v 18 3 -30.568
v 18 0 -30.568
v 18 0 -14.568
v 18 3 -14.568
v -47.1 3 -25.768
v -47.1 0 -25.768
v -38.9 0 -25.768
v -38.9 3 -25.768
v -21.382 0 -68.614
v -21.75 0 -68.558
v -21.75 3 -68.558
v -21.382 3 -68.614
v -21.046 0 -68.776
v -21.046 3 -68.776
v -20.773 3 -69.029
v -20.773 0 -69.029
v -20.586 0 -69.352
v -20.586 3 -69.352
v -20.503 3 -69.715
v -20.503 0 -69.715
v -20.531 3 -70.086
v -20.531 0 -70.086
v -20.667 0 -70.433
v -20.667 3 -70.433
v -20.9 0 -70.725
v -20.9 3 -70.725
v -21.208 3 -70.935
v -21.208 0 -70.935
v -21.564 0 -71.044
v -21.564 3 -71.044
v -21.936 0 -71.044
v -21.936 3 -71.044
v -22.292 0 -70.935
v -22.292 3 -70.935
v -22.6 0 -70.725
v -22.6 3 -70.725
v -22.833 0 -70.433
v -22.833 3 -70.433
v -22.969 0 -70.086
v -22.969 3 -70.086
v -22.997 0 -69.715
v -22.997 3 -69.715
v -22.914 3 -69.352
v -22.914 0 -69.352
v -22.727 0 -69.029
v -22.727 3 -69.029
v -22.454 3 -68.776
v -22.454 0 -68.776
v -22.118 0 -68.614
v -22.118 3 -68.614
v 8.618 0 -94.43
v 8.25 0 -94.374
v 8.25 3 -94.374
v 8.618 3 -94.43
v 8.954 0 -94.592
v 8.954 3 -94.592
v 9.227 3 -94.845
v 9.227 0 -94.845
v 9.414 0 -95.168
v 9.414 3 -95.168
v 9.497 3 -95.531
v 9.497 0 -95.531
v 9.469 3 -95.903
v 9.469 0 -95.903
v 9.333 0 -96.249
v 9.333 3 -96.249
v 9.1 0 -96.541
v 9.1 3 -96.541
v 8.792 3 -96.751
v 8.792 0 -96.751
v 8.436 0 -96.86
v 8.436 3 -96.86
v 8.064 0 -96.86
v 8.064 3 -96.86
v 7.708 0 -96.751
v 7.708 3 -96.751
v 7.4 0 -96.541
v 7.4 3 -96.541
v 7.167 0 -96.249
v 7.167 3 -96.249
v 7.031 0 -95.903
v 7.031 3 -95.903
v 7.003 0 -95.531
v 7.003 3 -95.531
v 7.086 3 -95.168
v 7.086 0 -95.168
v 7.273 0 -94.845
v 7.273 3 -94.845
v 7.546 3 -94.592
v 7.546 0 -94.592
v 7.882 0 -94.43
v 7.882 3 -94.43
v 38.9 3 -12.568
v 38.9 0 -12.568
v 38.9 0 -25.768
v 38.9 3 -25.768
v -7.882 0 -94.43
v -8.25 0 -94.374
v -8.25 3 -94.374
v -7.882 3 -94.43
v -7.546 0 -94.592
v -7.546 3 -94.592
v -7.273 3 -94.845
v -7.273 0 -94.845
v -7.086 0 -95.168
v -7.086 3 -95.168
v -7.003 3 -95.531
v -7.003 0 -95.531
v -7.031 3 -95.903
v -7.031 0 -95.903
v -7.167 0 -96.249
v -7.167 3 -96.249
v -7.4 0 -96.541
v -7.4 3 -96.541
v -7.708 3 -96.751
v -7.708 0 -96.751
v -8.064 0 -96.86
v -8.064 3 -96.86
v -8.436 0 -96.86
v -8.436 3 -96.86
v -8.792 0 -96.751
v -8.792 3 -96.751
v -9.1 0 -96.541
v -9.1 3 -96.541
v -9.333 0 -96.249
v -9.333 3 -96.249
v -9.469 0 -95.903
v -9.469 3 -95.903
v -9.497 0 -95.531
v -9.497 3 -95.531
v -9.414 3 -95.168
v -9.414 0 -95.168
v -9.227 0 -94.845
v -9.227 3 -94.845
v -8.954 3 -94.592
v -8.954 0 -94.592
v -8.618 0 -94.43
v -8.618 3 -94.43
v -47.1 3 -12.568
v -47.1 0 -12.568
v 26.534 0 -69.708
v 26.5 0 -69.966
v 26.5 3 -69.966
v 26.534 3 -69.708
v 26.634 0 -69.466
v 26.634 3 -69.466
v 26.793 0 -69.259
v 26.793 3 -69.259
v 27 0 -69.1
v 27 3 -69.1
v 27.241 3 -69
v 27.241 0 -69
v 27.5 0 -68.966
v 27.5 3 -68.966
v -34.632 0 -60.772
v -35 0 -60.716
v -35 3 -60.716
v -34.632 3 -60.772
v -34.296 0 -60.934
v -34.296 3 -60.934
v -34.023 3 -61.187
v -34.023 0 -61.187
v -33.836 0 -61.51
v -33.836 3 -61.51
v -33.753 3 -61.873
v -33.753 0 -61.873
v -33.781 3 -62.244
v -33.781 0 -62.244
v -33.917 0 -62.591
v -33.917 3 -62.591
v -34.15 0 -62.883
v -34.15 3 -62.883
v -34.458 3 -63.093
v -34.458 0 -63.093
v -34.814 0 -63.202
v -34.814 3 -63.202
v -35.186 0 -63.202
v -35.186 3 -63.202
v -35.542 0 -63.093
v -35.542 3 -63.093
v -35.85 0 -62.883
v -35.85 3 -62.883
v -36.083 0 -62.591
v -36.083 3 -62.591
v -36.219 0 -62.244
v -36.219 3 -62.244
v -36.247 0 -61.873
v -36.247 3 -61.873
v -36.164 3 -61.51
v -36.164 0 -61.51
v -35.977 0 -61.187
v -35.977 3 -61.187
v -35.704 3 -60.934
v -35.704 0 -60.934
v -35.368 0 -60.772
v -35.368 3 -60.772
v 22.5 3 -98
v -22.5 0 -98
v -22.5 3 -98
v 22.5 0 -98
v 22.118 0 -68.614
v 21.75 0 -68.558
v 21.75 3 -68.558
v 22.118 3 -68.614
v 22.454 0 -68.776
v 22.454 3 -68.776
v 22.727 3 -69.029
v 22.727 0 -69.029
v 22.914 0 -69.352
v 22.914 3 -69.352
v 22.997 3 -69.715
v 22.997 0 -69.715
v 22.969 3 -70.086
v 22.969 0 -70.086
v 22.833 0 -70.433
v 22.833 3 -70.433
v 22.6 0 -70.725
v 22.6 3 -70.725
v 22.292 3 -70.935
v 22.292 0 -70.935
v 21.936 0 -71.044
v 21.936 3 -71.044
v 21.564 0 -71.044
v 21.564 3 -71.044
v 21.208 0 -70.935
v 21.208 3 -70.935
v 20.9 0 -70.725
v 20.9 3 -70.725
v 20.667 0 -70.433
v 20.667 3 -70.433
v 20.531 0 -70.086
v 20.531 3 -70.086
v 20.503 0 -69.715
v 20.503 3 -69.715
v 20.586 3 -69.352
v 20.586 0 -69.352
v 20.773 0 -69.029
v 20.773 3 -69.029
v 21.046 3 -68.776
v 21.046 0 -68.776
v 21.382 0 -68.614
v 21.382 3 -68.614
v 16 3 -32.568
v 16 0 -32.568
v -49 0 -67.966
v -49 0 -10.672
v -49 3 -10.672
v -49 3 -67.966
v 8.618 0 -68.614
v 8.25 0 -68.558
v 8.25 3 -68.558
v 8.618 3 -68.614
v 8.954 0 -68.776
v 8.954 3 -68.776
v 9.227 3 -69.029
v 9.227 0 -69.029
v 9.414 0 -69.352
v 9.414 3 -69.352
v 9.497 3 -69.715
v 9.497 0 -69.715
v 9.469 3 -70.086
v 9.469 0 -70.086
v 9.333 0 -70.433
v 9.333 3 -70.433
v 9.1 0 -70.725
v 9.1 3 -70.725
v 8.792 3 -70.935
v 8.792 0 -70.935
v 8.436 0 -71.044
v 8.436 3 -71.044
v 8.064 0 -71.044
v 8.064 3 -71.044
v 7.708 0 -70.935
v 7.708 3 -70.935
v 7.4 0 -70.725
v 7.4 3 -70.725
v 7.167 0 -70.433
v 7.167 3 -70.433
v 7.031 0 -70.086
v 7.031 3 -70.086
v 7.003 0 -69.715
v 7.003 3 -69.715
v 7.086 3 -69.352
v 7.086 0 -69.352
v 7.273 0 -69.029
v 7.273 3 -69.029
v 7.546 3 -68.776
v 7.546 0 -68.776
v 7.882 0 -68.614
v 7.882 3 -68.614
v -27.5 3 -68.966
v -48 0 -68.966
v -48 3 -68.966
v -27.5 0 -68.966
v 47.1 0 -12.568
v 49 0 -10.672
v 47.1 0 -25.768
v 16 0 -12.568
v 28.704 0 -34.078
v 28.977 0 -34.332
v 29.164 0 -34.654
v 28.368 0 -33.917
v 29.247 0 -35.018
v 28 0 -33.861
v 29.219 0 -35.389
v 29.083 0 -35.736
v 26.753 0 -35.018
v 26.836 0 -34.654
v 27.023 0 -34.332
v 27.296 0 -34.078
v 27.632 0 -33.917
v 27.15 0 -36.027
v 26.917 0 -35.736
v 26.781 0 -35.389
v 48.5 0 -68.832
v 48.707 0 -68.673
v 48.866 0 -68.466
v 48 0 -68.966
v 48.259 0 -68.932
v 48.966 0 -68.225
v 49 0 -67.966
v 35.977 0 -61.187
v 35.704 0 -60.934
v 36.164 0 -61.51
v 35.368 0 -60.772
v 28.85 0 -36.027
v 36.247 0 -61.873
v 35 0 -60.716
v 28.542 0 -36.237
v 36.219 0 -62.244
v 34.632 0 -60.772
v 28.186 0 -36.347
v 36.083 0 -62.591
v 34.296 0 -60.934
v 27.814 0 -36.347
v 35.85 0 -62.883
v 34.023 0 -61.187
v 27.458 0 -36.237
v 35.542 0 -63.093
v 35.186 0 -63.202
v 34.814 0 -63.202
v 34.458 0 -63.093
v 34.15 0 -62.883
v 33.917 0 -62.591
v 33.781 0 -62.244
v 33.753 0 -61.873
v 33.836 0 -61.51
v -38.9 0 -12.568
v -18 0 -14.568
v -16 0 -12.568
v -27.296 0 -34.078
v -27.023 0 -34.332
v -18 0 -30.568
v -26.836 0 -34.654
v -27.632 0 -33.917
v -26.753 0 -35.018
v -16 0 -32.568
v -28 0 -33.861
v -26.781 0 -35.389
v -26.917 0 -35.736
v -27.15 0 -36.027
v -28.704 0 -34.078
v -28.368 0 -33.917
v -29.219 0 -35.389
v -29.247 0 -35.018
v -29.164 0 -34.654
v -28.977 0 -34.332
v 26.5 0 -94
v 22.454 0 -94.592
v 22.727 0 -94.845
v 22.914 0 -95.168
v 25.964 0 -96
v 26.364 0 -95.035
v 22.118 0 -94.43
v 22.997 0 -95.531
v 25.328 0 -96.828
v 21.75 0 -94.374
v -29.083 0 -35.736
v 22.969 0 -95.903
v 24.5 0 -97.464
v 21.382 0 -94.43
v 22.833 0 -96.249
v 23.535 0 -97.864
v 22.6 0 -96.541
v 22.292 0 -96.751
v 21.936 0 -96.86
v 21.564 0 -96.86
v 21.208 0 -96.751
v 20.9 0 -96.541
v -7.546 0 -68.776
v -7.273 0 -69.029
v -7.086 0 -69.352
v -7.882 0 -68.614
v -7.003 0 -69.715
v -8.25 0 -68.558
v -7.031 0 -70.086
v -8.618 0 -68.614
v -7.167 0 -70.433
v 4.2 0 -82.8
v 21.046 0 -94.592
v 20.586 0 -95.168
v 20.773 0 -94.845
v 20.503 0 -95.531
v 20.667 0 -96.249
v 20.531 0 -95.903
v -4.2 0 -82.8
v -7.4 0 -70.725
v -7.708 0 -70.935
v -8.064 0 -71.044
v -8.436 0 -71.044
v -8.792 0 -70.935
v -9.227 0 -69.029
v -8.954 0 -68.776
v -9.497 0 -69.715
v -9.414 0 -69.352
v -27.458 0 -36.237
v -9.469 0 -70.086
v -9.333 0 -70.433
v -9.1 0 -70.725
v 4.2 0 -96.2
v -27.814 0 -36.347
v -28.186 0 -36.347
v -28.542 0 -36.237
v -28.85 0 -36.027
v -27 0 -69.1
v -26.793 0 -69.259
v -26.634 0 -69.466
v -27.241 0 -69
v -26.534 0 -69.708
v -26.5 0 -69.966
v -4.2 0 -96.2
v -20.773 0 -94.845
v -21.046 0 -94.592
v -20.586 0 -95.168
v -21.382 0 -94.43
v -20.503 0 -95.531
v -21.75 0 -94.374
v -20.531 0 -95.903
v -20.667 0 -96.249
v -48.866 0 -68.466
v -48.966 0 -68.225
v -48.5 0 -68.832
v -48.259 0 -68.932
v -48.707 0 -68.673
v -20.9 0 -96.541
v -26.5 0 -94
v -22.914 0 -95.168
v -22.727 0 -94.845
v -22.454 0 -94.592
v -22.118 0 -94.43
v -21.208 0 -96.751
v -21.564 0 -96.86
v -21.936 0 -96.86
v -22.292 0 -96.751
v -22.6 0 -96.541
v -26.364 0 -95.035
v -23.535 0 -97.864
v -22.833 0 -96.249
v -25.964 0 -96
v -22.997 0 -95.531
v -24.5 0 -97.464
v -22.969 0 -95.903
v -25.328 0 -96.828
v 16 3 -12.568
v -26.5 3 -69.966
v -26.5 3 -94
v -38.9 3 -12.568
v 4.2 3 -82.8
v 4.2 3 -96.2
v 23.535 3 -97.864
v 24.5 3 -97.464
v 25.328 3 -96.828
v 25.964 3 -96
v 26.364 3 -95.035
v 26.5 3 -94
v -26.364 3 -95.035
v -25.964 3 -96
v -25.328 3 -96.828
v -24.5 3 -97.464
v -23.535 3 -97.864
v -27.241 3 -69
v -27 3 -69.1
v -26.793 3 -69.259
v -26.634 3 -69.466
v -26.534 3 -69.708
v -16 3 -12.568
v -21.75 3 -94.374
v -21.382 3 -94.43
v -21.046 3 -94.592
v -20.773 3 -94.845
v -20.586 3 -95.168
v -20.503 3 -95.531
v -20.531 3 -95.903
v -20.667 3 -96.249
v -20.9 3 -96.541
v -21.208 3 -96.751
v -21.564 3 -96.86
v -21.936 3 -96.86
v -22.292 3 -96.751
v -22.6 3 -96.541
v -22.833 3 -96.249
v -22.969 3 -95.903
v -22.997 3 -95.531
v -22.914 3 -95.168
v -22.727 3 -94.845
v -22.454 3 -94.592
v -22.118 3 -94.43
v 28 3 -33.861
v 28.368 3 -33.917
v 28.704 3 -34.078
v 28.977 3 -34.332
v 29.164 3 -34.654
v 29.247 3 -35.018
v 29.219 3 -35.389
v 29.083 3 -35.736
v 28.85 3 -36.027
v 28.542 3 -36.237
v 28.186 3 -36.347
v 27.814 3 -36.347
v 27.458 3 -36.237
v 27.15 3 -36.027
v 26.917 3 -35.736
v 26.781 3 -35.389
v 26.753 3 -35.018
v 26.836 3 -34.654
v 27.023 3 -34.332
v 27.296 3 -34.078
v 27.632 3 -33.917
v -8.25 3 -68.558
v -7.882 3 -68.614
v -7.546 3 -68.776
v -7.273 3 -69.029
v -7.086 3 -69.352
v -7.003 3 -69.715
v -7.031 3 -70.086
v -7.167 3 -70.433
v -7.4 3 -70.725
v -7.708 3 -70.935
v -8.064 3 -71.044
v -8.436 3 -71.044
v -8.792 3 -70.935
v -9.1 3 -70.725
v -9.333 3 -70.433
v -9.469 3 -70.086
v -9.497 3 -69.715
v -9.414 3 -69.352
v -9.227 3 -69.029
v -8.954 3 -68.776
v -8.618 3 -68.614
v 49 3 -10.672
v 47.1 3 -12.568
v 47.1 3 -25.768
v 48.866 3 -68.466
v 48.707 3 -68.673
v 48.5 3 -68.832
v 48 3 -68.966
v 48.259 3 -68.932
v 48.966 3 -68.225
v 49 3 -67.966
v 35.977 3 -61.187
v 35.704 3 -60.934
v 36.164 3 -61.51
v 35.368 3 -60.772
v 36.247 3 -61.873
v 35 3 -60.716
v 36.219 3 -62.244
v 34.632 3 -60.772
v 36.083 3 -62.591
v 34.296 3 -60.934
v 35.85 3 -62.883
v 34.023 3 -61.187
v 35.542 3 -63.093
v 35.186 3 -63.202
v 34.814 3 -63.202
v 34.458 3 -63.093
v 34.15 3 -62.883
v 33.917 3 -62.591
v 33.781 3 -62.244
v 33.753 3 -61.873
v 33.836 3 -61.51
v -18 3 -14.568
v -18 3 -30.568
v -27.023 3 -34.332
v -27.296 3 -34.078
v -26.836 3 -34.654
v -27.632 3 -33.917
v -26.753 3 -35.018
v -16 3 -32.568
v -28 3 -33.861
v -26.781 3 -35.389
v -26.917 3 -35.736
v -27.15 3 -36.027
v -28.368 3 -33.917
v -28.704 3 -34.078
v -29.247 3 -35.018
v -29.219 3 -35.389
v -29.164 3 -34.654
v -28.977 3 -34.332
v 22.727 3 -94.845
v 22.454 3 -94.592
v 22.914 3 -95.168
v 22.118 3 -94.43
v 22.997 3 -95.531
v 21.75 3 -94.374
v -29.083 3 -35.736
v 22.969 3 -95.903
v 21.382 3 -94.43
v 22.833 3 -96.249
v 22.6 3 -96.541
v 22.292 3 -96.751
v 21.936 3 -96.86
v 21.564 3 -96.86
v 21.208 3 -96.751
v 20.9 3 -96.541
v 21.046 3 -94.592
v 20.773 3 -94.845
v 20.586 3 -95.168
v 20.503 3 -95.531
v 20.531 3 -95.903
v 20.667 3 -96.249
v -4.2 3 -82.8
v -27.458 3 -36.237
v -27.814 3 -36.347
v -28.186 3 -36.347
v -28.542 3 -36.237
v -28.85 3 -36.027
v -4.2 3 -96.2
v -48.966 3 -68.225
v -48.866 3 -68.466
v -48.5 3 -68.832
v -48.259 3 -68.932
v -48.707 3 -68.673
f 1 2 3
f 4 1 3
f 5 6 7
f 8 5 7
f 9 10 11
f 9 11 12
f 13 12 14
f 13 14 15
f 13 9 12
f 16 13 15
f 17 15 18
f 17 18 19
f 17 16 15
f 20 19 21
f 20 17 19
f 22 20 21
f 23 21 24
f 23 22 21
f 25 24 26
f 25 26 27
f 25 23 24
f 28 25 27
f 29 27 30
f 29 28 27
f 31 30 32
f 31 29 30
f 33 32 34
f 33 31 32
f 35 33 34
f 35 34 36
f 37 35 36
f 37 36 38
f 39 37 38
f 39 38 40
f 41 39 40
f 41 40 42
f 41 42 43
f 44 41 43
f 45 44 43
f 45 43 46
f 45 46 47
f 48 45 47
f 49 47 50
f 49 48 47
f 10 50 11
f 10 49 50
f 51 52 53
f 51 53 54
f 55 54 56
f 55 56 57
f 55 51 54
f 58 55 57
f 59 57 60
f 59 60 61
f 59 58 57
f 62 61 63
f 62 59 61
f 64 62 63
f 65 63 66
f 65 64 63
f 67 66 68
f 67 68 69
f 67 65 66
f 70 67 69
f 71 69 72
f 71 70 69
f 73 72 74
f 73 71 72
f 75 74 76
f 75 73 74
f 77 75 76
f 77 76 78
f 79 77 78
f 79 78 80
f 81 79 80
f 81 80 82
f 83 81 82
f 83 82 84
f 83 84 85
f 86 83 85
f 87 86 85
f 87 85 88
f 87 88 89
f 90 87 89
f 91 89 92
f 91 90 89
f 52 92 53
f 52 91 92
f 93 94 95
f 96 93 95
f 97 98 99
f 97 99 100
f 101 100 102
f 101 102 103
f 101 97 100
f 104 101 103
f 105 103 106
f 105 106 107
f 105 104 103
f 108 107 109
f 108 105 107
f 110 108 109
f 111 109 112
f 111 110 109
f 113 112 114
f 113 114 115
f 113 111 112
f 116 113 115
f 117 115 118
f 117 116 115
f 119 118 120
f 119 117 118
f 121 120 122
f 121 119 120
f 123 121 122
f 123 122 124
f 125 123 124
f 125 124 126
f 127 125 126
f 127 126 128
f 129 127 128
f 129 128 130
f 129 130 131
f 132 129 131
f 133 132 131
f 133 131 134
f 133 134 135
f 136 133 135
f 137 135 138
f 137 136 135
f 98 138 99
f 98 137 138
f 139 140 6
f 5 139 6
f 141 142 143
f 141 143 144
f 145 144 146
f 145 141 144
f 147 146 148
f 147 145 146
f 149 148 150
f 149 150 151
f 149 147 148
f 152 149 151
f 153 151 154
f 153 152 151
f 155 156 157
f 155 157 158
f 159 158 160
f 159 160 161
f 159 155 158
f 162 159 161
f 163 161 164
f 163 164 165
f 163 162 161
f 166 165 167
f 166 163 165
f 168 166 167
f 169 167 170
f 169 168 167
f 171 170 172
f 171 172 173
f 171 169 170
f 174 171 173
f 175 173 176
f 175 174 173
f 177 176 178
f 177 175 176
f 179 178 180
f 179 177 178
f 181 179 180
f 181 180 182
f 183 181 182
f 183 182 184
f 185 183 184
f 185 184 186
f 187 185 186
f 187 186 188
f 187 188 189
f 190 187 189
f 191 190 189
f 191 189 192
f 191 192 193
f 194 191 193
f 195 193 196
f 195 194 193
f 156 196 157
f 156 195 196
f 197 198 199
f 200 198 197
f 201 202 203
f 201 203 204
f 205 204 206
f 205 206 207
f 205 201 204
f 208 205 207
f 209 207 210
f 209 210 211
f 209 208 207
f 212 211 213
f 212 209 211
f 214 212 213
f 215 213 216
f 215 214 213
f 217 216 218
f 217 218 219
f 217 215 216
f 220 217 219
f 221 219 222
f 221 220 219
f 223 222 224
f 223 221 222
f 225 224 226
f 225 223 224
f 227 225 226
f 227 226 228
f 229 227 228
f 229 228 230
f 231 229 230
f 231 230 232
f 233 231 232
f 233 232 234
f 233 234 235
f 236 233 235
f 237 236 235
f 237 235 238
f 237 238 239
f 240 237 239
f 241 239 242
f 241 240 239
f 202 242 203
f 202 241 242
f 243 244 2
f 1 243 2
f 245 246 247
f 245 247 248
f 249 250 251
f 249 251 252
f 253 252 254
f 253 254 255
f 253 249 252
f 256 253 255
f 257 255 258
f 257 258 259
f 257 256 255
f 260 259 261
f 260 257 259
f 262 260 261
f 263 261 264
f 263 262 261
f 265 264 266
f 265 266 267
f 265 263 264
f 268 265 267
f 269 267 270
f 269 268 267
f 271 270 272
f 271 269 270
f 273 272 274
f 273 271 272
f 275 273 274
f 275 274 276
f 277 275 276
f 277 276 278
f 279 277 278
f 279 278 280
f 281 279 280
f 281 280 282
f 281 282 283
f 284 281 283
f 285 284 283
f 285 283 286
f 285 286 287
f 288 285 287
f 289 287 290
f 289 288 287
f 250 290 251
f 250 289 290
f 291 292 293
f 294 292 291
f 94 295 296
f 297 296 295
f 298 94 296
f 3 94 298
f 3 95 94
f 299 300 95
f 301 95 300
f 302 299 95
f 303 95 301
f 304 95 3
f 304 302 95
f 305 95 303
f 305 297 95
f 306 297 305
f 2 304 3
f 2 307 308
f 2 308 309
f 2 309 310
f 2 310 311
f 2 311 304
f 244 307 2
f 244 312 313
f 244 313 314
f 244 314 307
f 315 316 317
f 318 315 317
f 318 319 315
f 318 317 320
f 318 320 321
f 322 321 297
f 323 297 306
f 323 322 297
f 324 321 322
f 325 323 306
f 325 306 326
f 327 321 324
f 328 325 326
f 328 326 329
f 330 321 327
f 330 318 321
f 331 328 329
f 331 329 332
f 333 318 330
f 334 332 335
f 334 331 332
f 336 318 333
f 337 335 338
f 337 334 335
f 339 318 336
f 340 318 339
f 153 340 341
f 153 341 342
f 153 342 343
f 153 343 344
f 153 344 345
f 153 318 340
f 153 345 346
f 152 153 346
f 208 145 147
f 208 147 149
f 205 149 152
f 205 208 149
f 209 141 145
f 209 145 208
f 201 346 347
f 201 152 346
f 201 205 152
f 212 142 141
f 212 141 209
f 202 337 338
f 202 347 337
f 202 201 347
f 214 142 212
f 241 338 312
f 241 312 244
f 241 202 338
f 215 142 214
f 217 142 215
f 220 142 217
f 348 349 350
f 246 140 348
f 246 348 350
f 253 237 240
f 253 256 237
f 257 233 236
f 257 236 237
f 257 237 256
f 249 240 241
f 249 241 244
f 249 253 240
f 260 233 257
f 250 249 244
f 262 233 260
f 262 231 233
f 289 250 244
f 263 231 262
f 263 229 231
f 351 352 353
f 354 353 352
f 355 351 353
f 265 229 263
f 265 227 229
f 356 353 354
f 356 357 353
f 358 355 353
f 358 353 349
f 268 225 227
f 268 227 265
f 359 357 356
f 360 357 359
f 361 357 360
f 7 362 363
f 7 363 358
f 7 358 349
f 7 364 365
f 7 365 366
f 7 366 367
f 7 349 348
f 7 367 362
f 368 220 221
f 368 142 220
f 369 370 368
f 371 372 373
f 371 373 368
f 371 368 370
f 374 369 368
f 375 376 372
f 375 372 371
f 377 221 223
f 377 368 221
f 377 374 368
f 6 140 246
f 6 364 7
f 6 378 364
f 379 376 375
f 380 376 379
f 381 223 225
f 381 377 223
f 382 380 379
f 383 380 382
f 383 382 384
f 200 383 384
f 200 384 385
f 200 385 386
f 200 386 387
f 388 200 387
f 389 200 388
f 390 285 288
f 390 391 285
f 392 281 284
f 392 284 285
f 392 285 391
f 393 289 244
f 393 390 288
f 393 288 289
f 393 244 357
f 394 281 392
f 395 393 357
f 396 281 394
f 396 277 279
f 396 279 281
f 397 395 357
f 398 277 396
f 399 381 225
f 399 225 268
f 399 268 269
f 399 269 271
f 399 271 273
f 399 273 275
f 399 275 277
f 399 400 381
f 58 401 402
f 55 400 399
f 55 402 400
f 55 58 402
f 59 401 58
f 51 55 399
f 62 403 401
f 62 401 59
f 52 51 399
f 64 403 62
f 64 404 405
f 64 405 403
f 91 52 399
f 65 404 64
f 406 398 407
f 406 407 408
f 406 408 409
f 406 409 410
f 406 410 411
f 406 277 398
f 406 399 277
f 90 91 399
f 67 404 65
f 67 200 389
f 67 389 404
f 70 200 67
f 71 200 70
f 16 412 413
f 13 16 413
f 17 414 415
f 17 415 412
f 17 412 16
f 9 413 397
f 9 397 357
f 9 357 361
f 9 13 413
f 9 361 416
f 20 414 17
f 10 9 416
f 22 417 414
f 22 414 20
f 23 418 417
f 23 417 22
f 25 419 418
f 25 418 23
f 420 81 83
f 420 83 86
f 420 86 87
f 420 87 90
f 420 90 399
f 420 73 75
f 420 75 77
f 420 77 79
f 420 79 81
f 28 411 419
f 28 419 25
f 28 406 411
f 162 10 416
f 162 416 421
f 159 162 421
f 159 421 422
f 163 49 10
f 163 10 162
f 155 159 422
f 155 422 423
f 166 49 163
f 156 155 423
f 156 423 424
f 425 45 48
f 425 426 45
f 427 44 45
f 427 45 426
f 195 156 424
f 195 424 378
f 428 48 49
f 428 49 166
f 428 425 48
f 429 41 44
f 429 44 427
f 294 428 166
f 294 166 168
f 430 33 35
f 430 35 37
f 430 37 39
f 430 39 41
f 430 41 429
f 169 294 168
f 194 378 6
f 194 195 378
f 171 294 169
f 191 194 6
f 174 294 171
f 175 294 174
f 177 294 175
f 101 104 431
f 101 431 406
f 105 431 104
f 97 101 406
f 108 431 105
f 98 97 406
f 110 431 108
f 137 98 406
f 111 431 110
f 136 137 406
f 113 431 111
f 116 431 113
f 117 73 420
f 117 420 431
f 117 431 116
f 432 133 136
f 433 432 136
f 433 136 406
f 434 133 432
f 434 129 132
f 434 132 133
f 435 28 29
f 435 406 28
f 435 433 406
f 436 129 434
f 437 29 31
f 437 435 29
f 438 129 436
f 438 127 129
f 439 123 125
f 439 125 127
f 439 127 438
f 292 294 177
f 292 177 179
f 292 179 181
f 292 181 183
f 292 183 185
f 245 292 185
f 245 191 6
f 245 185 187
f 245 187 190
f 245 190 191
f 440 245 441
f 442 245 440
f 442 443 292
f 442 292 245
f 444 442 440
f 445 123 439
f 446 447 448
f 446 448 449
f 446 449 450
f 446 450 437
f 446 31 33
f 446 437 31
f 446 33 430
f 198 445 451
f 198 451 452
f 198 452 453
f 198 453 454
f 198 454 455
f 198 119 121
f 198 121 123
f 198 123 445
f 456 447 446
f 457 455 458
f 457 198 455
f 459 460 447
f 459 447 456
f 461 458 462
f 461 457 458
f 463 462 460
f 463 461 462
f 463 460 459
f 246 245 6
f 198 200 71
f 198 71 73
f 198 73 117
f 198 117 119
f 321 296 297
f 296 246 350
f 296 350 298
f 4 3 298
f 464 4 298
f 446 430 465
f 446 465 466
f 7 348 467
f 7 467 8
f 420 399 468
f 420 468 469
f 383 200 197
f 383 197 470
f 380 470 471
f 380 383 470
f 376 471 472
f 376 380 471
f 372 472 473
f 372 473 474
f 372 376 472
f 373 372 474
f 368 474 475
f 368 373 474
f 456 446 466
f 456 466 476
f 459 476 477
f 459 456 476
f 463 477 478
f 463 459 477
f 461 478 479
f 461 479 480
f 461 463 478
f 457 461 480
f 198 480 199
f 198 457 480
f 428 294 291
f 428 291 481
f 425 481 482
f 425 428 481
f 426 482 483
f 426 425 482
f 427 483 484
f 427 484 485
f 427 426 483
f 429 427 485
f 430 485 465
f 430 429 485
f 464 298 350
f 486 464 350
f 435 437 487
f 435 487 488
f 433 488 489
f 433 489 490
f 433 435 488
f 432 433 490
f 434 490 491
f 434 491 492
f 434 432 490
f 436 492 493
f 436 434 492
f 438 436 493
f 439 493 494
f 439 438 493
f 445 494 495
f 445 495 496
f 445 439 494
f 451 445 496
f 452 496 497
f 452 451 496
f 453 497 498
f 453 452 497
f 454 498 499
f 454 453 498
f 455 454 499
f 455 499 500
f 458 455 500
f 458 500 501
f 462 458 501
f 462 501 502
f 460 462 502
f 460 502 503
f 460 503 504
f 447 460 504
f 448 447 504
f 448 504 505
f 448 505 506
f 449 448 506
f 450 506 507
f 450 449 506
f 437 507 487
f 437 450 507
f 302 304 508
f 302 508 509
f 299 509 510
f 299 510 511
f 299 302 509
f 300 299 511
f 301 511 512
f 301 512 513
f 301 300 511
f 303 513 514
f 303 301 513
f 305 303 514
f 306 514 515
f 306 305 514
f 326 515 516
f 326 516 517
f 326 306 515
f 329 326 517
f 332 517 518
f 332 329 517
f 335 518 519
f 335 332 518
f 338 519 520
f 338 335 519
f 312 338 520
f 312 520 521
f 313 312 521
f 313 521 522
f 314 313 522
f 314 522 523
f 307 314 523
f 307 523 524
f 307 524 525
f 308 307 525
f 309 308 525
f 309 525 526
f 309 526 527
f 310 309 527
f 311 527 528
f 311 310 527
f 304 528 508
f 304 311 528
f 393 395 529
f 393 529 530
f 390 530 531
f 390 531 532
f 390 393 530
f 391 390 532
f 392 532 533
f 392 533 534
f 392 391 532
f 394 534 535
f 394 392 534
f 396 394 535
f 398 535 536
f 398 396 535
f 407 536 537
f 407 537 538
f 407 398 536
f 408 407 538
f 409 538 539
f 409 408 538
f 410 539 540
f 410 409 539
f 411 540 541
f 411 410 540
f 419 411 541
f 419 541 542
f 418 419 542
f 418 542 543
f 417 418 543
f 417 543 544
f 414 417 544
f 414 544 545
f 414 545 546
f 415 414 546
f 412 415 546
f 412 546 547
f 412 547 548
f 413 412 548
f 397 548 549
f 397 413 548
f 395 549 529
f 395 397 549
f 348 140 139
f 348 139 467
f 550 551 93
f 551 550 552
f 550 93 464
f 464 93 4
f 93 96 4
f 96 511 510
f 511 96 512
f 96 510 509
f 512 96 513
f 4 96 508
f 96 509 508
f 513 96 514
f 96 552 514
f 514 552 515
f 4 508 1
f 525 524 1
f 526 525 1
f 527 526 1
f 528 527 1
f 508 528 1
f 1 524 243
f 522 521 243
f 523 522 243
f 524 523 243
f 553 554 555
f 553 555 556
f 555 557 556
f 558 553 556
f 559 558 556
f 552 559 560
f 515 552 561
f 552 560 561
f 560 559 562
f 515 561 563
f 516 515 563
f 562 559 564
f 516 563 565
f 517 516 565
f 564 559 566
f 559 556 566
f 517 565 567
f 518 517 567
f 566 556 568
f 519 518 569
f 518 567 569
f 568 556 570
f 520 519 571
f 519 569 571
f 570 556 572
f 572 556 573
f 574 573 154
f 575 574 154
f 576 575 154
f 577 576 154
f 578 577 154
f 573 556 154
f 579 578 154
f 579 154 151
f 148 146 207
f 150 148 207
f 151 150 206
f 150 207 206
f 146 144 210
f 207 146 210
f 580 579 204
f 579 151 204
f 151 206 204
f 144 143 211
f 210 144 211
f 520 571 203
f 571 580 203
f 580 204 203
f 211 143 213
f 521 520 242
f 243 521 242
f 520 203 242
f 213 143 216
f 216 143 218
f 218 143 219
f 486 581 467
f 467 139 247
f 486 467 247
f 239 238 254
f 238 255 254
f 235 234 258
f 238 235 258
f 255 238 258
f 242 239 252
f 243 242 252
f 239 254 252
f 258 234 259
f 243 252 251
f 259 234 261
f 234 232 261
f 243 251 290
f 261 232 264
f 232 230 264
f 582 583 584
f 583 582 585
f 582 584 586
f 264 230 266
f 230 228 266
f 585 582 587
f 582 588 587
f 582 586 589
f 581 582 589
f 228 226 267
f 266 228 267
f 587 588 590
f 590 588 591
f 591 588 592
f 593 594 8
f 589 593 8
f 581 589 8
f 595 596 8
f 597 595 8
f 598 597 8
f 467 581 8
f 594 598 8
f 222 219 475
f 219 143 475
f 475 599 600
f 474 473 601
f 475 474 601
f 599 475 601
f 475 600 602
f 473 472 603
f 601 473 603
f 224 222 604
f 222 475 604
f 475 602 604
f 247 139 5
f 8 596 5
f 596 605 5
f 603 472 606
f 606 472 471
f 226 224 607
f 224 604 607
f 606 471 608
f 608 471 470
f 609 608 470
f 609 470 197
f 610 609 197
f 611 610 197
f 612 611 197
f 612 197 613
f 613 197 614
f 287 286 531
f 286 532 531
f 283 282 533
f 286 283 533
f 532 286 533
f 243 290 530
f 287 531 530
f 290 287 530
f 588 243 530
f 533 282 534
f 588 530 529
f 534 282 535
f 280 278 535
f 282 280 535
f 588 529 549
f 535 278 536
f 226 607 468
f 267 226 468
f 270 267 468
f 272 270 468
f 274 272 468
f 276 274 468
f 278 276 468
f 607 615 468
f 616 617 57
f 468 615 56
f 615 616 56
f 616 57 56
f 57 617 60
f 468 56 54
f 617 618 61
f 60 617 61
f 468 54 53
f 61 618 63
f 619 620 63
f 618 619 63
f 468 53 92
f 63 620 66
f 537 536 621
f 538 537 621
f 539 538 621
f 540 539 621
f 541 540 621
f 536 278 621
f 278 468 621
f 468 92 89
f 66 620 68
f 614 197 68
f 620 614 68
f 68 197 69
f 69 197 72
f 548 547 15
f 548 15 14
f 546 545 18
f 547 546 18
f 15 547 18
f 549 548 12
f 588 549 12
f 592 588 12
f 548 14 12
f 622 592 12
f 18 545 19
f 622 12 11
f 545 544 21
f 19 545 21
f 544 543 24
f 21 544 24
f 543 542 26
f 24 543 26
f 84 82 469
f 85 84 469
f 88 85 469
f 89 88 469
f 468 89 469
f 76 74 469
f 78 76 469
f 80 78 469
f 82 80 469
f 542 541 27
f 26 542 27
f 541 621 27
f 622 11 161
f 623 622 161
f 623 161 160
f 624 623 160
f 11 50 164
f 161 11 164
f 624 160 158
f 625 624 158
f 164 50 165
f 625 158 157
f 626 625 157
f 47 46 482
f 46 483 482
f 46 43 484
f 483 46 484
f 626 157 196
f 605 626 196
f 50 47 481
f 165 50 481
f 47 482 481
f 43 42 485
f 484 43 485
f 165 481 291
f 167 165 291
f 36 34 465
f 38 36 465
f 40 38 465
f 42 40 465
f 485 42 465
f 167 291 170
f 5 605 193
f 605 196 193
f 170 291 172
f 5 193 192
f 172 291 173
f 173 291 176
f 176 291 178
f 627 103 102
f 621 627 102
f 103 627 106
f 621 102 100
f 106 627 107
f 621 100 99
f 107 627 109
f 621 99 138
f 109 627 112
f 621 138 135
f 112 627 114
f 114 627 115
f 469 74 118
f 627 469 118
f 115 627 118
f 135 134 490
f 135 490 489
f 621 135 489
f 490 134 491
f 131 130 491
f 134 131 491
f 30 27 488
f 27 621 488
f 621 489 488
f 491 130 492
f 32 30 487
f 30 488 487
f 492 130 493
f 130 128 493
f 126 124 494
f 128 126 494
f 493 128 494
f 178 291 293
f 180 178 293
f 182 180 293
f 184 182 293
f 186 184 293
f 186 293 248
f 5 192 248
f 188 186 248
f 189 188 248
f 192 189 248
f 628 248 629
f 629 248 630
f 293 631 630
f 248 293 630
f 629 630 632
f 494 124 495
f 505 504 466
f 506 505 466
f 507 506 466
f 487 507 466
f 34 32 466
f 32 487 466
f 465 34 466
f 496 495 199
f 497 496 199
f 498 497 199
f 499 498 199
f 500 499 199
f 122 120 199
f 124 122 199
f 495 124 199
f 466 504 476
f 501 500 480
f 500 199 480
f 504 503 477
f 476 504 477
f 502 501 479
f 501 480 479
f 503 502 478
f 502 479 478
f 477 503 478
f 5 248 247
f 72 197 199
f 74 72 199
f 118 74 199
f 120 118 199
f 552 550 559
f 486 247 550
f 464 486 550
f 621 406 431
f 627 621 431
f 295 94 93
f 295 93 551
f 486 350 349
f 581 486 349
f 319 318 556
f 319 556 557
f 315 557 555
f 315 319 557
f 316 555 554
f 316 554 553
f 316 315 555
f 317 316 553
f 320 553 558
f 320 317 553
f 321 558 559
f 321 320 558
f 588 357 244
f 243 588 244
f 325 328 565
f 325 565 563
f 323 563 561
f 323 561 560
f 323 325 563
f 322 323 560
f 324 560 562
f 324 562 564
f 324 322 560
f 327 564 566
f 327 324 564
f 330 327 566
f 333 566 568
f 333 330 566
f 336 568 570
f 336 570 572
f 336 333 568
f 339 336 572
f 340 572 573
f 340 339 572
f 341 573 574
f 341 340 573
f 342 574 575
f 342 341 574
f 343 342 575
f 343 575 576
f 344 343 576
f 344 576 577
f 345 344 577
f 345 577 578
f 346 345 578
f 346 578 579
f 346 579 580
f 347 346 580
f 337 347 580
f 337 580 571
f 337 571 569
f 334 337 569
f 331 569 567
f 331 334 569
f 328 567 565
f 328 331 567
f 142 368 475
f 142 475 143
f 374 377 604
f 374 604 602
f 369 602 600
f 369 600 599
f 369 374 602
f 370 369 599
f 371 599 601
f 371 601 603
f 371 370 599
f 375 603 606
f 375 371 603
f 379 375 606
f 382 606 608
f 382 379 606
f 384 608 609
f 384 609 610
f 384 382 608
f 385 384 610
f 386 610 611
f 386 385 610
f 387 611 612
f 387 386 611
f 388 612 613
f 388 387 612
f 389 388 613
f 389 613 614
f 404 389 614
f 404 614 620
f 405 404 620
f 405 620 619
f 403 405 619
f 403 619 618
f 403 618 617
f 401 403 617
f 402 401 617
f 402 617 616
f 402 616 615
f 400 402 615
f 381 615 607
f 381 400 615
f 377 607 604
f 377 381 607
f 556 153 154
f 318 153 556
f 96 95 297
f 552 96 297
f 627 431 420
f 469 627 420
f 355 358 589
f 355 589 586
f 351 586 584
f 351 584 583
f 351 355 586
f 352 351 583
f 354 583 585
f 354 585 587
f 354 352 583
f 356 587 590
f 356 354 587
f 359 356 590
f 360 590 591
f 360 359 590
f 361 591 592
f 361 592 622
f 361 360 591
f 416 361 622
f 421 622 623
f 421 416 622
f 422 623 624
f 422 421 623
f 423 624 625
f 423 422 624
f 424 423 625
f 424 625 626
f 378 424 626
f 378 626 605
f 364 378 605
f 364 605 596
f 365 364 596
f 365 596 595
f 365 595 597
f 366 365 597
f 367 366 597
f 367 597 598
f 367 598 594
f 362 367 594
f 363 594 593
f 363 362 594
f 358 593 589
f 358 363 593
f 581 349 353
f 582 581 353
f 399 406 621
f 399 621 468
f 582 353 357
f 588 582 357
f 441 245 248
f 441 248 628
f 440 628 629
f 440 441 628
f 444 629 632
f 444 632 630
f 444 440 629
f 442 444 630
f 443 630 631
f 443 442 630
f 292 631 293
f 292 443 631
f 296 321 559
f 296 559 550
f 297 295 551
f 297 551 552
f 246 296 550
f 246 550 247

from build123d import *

# Parameters (mm, degrees)
SKETCH_1_R      = 1.25
SKETCH_1_W      = 8.2
SKETCH_1_H      = 13.2
SKETCH_1_W_2    = 8.4
SKETCH_1_H_2    = 13.4
EXTRUDE_1_DEPTH = 3


with BuildPart() as part:
    # Эскиз1 → Бобышка-Вытянуть1 (new body)
    with BuildSketch(Plane(origin=(0, 0, 0), x_dir=(1, 0, 0), z_dir=(0, 1, 0))):
        with BuildLine():
            Line((-49, 10.671781602), (-49, 67.966339104))
            ThreePointArc((-49, 67.966339104), (-48.707106781, 68.673445885), (-48, 68.966339104))
            Line((-48, 68.966339104), (-27.5, 68.966339104))
            ThreePointArc((-27.5, 68.966339104), (-26.792893219, 69.259232322), (-26.5, 69.966339104))
            Line((-26.5, 69.966339104), (-26.5, 94))
            ThreePointArc((-26.5, 94), (-25.328427125, 96.828427125), (-22.5, 98))
            Line((-22.5, 98), (22.5, 98))
            ThreePointArc((22.5, 98), (25.328427125, 96.828427125), (26.5, 94))
            Line((26.5, 94), (26.5, 69.966339104))
            ThreePointArc((26.5, 69.966339104), (26.792893219, 69.259232322), (27.5, 68.966339104))
            Line((27.5, 68.966339104), (48, 68.966339104))
            ThreePointArc((48, 68.966339104), (48.707106781, 68.673445885), (49, 67.966339104))
            Line((49, 67.966339104), (49, 10.671781602))
            Line((49, 10.671781602), (-49, 10.671781602))
        make_face()
        with Locations(Location((-21.75, 95.624367377, 0), (0, 0, 270))):
            Circle(SKETCH_1_R, mode=Mode.SUBTRACT)
        with Locations(Location((-8.25, 95.624367377, 0), (0, 0, 270))):
            Circle(SKETCH_1_R, mode=Mode.SUBTRACT)
        with Locations(Location((8.25, 95.624367377, 0), (0, 0, 270))):
            Circle(SKETCH_1_R, mode=Mode.SUBTRACT)
        with Locations(Location((21.75, 95.624367377, 0), (0, 0, 270))):
            Circle(SKETCH_1_R, mode=Mode.SUBTRACT)
        with Locations(Location((21.75, 69.808310831, 0), (0, 0, 270))):
            Circle(SKETCH_1_R, mode=Mode.SUBTRACT)
        with Locations(Location((8.25, 69.808310831, 0), (0, 0, 270))):
            Circle(SKETCH_1_R, mode=Mode.SUBTRACT)
        with Locations(Location((-8.25, 69.808310831, 0), (0, 0, 270))):
            Circle(SKETCH_1_R, mode=Mode.SUBTRACT)
        with Locations(Location((-21.75, 69.808310831, 0), (0, 0, 270))):
            Circle(SKETCH_1_R, mode=Mode.SUBTRACT)
        with Locations(Location((-35, 61.966339104, 0), (0, 0, 270))):
            Circle(SKETCH_1_R, mode=Mode.SUBTRACT)
        with Locations(Location((-28, 35.111011166, 0), (0, 0, 270))):
            Circle(SKETCH_1_R, mode=Mode.SUBTRACT)
        with Locations(Location((28, 35.111011166, 0), (0, 0, 270))):
            Circle(SKETCH_1_R, mode=Mode.SUBTRACT)
        with Locations(Location((35, 61.966339104, 0), (0, 0, 270))):
            Circle(SKETCH_1_R, mode=Mode.SUBTRACT)
        with Locations((-43, 19.167635493)):
            Rectangle(SKETCH_1_W, SKETCH_1_H, mode=Mode.SUBTRACT)
        with Locations((43, 19.167635493)):
            Rectangle(SKETCH_1_W, SKETCH_1_H, mode=Mode.SUBTRACT)
        with Locations((0, 89.5)):
            Rectangle(SKETCH_1_W_2, SKETCH_1_H_2, mode=Mode.SUBTRACT)
        Polygon((16, 12.567635493), (-16, 12.567635493), (-18, 14.567635493), (-18, 30.567635493), (-16, 32.567635493), (16, 32.567635493), (18, 30.567635493), (18, 14.567635493), align=None, mode=Mode.SUBTRACT)
    extrude(amount=EXTRUDE_1_DEPTH)


solid = part.part
